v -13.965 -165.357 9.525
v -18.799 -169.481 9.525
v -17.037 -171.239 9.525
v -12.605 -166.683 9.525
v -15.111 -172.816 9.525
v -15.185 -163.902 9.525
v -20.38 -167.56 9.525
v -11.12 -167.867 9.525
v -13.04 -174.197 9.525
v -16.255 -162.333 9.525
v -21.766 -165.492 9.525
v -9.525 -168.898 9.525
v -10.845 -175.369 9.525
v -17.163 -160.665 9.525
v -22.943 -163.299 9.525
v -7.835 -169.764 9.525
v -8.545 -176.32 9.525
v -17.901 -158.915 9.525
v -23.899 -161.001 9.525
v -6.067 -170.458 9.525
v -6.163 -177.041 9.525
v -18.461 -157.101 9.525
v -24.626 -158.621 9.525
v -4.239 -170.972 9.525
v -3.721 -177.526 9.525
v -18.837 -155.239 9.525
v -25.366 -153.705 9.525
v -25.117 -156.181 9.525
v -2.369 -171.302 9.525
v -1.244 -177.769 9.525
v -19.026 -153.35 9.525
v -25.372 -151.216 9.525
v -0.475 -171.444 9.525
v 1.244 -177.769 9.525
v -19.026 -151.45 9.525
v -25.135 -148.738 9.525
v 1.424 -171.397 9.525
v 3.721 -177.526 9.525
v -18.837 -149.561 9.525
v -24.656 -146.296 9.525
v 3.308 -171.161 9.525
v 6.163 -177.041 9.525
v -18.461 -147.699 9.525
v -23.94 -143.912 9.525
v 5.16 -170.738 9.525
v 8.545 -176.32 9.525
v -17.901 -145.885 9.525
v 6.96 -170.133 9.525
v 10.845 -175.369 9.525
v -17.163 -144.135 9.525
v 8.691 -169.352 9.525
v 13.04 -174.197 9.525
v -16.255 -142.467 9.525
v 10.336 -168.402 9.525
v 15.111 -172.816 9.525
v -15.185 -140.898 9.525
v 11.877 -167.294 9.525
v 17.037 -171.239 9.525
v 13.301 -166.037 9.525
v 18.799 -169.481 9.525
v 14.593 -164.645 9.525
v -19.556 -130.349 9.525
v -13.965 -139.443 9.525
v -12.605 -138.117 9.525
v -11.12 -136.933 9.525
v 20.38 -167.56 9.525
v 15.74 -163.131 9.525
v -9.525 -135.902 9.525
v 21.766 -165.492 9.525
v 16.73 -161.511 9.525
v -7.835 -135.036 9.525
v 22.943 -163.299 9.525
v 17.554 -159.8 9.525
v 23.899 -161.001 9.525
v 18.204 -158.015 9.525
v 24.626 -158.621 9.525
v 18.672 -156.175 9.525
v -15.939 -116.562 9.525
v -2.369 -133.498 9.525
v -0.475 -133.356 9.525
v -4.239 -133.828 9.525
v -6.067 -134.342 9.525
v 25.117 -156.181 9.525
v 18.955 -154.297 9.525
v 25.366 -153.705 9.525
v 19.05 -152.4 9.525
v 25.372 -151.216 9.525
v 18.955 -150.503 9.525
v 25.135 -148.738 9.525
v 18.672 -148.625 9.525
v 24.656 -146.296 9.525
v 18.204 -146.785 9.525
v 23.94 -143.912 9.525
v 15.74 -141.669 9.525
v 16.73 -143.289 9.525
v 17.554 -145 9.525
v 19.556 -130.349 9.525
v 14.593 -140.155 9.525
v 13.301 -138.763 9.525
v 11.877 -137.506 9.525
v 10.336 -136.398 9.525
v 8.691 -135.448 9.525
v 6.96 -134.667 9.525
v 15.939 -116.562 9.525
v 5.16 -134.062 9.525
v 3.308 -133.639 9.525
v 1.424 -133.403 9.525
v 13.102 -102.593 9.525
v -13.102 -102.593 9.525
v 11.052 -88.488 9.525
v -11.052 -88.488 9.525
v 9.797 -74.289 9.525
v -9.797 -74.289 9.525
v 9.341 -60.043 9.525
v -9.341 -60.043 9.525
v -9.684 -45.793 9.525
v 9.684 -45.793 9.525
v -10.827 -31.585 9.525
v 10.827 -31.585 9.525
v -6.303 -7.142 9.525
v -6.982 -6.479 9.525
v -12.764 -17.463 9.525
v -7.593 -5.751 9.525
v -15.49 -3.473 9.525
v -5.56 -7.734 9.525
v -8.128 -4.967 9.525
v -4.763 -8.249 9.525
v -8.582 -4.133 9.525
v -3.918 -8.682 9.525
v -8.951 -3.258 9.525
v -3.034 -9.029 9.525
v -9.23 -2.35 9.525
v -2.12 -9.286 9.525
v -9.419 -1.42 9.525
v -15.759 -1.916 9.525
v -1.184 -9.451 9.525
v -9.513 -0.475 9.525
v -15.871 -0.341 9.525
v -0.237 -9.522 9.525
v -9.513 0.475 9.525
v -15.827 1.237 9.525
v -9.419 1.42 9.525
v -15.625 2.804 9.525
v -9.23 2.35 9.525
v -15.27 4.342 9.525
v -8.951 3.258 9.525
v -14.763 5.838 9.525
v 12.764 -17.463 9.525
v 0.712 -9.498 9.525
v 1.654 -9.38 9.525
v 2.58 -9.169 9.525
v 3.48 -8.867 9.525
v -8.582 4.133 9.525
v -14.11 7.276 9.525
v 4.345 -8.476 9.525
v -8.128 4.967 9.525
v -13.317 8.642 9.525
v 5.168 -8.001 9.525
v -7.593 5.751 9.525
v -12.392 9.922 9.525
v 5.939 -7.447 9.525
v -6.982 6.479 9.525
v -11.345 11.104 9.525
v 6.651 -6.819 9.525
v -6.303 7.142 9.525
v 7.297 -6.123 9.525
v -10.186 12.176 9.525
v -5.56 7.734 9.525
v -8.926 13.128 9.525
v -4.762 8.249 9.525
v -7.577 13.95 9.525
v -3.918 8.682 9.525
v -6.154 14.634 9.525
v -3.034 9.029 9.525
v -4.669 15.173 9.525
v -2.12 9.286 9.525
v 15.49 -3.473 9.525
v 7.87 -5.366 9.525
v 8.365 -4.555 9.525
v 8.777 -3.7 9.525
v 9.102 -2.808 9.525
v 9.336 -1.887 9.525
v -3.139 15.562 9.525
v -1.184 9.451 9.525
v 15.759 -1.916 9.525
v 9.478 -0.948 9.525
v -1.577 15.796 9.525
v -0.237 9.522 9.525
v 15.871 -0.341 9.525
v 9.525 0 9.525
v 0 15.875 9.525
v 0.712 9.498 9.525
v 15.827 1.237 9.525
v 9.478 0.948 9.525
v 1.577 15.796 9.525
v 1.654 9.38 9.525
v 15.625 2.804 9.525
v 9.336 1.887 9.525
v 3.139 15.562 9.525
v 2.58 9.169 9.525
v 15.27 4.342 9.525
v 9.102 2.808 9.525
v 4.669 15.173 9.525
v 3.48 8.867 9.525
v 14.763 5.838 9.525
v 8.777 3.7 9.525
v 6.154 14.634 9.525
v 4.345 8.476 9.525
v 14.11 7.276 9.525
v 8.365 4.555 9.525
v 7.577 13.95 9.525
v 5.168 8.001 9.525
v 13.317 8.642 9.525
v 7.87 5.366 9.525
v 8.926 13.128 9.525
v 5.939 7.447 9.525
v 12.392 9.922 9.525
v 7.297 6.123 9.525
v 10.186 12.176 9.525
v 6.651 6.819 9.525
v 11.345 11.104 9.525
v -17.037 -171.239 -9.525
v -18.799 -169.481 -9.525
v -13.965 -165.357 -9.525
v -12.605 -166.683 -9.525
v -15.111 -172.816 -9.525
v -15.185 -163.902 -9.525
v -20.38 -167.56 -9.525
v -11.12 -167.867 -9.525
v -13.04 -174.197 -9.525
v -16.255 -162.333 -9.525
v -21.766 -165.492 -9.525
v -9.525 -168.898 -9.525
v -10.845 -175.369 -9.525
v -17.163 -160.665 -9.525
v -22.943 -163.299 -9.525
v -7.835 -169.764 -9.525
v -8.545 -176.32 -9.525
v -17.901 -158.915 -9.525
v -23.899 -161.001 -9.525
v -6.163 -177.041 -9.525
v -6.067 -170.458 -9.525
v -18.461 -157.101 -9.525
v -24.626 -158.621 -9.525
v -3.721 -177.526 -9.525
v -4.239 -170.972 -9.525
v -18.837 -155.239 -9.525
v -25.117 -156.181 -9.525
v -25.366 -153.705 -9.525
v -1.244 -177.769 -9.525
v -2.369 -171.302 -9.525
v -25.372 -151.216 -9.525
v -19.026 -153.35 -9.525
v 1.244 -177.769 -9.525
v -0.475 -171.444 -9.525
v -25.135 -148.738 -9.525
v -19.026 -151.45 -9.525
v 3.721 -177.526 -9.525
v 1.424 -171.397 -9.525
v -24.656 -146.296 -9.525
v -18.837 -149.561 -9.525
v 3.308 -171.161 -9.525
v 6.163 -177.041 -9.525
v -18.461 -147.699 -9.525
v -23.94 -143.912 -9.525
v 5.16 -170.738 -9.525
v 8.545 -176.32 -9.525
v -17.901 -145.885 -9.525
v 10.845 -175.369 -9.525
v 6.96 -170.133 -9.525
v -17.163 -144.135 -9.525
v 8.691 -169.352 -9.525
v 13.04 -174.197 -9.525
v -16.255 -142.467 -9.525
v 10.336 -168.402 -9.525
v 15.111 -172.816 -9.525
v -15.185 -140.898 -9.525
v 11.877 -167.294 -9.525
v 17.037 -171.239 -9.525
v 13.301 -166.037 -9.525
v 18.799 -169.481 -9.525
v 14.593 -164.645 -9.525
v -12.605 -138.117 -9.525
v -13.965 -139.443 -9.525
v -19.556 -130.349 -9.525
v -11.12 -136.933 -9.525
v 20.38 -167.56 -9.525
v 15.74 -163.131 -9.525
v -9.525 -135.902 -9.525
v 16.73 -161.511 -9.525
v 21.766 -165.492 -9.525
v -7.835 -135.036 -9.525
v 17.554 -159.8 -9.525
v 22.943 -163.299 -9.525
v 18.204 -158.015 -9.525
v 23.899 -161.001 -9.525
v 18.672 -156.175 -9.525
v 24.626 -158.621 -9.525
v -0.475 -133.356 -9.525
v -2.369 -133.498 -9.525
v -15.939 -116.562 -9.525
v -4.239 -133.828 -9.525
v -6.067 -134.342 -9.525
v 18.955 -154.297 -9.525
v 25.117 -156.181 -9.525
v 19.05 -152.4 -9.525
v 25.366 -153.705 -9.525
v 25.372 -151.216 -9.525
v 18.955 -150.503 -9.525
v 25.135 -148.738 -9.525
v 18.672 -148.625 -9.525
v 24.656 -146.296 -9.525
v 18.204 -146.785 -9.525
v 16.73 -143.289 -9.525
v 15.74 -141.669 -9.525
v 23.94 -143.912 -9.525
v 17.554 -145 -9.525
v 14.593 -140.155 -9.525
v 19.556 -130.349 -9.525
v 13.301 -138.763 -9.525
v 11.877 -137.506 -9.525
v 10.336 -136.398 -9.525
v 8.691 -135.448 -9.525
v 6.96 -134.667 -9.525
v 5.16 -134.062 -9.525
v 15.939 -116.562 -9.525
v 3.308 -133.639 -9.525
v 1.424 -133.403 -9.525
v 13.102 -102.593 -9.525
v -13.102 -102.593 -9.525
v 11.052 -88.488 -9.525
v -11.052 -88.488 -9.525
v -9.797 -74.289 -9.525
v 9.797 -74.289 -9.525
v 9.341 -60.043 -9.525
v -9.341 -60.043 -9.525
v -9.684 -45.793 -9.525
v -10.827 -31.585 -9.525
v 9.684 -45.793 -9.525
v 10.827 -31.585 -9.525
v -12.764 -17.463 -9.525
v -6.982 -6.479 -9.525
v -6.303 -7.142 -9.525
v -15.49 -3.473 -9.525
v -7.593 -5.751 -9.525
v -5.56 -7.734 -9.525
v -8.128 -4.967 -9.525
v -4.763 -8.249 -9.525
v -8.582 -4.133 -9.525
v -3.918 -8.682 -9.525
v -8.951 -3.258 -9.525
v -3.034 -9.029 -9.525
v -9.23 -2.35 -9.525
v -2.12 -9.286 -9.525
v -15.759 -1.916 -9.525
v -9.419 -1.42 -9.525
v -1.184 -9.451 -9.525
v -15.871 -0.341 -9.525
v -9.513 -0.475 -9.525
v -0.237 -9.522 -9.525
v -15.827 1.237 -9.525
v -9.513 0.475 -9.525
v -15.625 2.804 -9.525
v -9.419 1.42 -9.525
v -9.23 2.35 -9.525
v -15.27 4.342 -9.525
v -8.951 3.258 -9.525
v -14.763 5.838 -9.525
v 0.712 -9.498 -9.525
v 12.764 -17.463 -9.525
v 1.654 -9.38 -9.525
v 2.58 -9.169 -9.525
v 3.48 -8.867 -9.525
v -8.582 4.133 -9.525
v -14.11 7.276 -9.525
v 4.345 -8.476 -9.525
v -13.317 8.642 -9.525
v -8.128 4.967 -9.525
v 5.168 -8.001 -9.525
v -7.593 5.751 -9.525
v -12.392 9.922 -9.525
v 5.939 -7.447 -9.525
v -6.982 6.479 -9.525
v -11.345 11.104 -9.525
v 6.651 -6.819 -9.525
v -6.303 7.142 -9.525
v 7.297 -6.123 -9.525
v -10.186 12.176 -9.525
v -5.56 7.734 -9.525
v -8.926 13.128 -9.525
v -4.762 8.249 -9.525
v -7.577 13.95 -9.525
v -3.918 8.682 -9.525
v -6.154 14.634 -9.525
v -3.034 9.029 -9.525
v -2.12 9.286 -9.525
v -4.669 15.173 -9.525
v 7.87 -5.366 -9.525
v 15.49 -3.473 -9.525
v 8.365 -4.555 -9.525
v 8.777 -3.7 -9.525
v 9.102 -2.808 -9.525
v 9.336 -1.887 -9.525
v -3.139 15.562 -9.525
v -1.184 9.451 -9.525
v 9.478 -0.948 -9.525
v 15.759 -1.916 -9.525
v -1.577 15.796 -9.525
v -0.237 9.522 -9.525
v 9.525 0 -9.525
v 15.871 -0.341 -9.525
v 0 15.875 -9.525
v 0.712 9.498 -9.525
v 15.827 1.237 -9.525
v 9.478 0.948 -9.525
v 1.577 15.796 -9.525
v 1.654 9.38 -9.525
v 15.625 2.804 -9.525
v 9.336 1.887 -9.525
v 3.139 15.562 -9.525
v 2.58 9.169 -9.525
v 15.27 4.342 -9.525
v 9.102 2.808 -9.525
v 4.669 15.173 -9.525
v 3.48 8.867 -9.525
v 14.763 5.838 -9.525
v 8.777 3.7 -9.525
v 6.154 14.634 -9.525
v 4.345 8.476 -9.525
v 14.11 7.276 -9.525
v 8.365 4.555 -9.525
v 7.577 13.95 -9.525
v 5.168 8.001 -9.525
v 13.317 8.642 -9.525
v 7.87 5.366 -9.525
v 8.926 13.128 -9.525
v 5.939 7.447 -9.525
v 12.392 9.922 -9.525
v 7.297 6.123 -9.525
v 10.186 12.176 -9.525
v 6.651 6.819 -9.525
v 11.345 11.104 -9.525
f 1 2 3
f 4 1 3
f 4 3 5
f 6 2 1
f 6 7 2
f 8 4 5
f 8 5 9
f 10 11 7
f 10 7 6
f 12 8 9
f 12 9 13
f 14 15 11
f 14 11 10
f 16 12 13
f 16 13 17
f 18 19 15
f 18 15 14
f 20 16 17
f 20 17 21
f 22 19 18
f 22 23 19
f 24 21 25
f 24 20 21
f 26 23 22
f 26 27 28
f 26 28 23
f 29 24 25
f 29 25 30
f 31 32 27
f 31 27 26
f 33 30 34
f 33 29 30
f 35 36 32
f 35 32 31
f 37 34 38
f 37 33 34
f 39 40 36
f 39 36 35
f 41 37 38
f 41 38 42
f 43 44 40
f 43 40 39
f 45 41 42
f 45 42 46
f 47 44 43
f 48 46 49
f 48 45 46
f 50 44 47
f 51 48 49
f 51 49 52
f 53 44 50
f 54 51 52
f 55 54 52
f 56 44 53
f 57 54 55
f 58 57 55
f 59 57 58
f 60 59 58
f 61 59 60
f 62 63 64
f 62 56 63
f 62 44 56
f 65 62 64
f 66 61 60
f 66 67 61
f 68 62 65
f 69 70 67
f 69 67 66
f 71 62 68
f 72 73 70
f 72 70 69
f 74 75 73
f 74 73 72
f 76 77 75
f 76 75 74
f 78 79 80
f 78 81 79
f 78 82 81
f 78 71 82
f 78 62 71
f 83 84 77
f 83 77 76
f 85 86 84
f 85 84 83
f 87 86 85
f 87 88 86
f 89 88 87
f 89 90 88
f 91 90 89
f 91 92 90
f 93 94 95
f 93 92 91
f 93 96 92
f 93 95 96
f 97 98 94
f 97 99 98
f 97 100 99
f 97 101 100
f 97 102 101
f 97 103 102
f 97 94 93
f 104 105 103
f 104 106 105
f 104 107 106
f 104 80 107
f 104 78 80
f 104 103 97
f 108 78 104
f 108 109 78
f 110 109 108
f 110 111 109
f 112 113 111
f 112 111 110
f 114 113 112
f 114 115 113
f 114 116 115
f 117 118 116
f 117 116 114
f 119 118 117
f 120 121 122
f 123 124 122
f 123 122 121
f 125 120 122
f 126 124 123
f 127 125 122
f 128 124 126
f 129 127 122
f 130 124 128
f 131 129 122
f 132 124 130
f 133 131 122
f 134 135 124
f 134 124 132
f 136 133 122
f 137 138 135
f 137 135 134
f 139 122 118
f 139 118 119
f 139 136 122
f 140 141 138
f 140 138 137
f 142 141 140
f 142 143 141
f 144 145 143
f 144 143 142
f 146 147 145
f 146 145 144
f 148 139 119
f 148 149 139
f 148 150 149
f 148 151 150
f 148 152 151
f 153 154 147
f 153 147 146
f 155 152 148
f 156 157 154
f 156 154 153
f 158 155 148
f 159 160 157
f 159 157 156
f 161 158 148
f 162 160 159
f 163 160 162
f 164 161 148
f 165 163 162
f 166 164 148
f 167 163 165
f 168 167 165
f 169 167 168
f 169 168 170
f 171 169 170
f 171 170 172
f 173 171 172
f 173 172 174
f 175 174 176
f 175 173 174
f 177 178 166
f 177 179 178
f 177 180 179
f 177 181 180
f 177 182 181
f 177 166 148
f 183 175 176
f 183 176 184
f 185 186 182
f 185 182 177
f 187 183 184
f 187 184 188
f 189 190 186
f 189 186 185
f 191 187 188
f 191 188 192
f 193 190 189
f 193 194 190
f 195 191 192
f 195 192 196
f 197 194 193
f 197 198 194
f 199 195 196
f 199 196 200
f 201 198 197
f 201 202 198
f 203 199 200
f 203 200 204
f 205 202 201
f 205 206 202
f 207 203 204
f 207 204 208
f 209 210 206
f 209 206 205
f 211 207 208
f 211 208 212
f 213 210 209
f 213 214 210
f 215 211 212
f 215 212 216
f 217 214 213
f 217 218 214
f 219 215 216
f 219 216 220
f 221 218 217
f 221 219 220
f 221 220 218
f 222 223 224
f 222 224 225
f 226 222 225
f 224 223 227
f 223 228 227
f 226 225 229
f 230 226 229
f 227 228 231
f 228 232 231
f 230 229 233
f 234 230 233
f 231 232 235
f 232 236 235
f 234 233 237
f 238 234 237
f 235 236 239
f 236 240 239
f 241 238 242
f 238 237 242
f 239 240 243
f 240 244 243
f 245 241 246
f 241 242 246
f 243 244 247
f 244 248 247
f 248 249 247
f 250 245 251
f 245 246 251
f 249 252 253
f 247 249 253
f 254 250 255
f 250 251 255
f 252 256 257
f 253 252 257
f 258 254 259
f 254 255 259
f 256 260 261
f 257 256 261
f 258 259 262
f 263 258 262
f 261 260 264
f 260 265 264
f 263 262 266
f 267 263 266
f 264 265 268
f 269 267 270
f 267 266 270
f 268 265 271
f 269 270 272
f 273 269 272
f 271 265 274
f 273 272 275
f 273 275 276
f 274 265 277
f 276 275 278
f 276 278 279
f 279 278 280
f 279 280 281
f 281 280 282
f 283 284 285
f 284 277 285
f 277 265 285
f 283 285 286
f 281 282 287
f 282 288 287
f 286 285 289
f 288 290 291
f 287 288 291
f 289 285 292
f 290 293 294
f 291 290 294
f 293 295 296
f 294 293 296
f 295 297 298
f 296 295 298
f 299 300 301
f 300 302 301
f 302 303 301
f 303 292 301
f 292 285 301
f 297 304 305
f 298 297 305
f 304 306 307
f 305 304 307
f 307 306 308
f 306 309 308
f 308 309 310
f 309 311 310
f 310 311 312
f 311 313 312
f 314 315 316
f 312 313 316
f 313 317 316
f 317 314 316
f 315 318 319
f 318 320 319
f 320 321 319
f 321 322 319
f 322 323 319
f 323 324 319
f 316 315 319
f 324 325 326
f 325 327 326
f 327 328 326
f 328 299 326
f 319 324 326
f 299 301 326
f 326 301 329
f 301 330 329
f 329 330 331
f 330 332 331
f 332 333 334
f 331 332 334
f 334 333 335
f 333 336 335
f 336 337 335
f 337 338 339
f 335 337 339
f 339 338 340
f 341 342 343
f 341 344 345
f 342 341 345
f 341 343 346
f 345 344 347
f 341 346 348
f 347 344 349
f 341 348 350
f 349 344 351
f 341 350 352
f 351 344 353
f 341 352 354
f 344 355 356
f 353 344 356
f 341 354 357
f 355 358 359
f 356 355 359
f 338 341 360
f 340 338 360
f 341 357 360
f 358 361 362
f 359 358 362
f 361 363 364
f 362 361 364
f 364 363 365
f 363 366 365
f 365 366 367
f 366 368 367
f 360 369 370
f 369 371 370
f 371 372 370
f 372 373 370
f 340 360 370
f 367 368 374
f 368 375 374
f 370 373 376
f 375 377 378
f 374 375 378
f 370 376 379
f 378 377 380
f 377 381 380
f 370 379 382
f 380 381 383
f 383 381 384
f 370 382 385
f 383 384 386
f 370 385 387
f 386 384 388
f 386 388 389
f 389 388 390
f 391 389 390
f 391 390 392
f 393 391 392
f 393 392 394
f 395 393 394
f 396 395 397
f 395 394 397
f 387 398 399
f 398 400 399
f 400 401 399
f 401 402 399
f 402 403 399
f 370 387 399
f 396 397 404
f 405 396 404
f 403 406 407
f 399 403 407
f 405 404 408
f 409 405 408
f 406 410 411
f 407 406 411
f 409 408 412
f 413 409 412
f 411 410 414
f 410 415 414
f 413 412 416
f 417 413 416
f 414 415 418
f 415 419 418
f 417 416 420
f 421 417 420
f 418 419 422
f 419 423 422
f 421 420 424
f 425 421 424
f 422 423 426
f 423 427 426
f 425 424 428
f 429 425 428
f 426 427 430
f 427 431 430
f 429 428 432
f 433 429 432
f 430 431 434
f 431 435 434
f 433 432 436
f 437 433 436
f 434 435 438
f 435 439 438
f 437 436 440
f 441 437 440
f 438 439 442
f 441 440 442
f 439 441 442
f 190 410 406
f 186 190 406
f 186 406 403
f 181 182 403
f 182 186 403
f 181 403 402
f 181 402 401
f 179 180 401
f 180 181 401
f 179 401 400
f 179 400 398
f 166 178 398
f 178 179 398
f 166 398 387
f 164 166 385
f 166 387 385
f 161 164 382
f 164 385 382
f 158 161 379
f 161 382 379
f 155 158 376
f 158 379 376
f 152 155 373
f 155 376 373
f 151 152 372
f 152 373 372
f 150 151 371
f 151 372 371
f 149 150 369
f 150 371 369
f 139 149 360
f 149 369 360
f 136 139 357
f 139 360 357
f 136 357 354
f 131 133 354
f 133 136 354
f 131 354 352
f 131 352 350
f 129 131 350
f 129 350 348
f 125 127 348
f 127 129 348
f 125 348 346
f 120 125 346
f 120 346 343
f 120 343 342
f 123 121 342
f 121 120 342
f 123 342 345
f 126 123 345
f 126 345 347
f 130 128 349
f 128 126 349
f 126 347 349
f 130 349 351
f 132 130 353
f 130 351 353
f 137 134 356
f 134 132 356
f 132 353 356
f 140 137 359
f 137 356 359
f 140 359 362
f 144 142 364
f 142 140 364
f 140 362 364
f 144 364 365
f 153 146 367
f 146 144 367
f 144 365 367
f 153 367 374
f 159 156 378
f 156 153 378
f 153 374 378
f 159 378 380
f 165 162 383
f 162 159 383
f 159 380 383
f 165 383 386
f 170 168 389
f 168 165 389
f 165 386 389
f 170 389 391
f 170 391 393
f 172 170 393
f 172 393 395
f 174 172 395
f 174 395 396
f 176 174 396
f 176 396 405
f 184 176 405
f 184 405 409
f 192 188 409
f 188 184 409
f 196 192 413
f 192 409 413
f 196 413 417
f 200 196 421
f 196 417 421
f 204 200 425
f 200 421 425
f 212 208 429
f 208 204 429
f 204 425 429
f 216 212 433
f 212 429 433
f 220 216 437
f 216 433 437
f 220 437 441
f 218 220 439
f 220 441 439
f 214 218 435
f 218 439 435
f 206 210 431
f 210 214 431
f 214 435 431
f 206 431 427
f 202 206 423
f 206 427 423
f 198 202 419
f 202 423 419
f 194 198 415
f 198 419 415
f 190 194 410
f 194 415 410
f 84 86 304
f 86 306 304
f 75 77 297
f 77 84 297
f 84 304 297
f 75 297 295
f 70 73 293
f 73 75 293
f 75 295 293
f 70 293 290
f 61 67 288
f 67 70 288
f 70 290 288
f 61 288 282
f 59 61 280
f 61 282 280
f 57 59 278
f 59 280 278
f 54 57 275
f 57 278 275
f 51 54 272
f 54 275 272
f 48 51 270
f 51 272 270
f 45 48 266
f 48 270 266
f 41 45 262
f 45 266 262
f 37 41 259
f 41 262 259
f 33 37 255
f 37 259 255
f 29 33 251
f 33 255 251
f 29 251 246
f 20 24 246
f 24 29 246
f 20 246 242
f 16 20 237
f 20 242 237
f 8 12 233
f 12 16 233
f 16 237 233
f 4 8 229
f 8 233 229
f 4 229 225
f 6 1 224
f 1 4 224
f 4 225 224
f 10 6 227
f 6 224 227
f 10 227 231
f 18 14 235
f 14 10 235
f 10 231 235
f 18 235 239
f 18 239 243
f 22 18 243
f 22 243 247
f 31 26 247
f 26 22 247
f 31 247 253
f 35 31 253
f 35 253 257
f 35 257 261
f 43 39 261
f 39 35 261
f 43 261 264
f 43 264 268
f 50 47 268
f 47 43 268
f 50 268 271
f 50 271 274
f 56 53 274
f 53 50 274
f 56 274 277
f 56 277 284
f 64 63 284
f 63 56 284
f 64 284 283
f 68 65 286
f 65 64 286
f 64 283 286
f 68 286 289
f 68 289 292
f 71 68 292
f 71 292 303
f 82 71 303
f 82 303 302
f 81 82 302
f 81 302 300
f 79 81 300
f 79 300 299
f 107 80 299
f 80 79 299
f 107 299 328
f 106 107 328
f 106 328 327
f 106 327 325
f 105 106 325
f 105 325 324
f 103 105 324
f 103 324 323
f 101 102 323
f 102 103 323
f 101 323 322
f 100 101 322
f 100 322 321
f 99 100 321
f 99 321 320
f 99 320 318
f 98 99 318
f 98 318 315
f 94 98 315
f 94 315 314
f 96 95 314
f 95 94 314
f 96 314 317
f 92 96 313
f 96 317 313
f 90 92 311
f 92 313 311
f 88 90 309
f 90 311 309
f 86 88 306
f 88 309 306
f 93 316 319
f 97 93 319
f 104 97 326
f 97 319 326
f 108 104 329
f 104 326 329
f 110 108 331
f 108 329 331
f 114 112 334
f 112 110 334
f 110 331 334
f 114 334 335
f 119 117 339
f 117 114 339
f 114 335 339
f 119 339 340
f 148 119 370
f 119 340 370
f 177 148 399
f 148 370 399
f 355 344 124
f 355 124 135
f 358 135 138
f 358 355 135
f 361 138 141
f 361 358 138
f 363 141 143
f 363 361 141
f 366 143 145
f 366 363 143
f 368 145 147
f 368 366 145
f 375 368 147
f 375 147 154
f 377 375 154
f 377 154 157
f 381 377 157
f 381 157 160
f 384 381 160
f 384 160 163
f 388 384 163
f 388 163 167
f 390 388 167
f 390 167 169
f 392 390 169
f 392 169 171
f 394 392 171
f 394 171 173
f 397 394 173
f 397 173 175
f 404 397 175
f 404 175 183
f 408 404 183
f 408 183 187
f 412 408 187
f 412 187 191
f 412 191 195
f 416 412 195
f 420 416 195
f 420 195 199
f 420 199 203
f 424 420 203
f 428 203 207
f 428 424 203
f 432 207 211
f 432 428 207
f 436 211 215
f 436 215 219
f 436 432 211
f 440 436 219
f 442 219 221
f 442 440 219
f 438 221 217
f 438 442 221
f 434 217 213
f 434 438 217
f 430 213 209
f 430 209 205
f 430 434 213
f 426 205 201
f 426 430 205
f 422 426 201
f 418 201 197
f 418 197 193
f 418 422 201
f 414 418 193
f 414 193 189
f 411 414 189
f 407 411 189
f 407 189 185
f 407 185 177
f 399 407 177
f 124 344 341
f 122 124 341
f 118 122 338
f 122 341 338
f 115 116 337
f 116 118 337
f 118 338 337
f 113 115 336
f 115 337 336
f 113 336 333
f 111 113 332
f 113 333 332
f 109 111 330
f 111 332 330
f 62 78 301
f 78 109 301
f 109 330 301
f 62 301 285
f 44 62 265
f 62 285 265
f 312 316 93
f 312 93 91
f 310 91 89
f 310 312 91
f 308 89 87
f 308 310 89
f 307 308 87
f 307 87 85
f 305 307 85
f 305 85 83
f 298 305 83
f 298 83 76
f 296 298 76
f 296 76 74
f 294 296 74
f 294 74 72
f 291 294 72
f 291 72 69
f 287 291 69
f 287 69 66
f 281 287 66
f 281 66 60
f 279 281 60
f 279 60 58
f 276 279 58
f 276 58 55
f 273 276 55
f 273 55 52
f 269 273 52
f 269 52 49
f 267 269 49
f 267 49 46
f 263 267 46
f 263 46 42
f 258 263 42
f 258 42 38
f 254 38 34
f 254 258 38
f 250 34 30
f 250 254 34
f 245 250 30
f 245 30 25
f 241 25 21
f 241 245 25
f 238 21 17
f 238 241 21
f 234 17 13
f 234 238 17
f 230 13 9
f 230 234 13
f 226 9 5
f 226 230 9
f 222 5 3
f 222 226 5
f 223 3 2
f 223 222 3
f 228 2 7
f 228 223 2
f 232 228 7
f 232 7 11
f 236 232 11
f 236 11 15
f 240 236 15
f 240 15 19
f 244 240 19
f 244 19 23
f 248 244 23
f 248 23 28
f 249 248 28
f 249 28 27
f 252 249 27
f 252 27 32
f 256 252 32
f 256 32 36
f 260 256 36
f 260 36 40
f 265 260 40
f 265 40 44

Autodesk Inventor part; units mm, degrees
ref_plane "YZ Plane" through (0, 0, 0) normal (1, 0, 0) x (0, 1, 0)
ref_plane "XZ Plane" through (0, 0, 0) normal (0, 1, 0) x (-1, 0, 0)
ref_plane "XY Plane" through (0, 0, 0) normal (0, 0, 1) x (1, 0, 0)
sketch "Sketch1" plane through (0, 0, 0) normal (0, 0, 1) x (1, 0, 0)
  circle A0 centre (0, 0) radius 9.525
  circle A1 centre (0, -152.4) radius 19.05
  line L0 (0, -216.535) -> (0, 54.61) construction
  circle A2 centre (0, 0) radius 15.875
  circle A3 centre (0, -152.4) radius 25.4
  arc A4 (-23.9399, -143.9123) -> (-15.4905, -3.4727) centre (-263.3389, -59.0352) ccw
  arc A5 (15.4905, -3.4727) -> (23.9399, -143.9123) centre (263.3389, -59.0352) ccw
  point P0 (23.9399, -143.9123)
  point P1 (15.4905, -3.4727)
  dimension "d0" = 19.05
  dimension "d1" = 38.1
  dimension "conrod_ctc" = 152.4
  dimension "conrod_wt" = 6.35
  dimension "d5" = 6.35
  dimension "conrod_rad" = 254
extrude "Extrusion1" add sketch "Sketch1" along normal mid plane 19.05
equation "\"d0\" = pin_dia"
equation "\"d1\" = 2 * d0"
equation "\"d5\" = conrod_wt"
equation "\"pin_dia\" = 19.05"
properties part number "Connecting_Rod" material "Titanium"
